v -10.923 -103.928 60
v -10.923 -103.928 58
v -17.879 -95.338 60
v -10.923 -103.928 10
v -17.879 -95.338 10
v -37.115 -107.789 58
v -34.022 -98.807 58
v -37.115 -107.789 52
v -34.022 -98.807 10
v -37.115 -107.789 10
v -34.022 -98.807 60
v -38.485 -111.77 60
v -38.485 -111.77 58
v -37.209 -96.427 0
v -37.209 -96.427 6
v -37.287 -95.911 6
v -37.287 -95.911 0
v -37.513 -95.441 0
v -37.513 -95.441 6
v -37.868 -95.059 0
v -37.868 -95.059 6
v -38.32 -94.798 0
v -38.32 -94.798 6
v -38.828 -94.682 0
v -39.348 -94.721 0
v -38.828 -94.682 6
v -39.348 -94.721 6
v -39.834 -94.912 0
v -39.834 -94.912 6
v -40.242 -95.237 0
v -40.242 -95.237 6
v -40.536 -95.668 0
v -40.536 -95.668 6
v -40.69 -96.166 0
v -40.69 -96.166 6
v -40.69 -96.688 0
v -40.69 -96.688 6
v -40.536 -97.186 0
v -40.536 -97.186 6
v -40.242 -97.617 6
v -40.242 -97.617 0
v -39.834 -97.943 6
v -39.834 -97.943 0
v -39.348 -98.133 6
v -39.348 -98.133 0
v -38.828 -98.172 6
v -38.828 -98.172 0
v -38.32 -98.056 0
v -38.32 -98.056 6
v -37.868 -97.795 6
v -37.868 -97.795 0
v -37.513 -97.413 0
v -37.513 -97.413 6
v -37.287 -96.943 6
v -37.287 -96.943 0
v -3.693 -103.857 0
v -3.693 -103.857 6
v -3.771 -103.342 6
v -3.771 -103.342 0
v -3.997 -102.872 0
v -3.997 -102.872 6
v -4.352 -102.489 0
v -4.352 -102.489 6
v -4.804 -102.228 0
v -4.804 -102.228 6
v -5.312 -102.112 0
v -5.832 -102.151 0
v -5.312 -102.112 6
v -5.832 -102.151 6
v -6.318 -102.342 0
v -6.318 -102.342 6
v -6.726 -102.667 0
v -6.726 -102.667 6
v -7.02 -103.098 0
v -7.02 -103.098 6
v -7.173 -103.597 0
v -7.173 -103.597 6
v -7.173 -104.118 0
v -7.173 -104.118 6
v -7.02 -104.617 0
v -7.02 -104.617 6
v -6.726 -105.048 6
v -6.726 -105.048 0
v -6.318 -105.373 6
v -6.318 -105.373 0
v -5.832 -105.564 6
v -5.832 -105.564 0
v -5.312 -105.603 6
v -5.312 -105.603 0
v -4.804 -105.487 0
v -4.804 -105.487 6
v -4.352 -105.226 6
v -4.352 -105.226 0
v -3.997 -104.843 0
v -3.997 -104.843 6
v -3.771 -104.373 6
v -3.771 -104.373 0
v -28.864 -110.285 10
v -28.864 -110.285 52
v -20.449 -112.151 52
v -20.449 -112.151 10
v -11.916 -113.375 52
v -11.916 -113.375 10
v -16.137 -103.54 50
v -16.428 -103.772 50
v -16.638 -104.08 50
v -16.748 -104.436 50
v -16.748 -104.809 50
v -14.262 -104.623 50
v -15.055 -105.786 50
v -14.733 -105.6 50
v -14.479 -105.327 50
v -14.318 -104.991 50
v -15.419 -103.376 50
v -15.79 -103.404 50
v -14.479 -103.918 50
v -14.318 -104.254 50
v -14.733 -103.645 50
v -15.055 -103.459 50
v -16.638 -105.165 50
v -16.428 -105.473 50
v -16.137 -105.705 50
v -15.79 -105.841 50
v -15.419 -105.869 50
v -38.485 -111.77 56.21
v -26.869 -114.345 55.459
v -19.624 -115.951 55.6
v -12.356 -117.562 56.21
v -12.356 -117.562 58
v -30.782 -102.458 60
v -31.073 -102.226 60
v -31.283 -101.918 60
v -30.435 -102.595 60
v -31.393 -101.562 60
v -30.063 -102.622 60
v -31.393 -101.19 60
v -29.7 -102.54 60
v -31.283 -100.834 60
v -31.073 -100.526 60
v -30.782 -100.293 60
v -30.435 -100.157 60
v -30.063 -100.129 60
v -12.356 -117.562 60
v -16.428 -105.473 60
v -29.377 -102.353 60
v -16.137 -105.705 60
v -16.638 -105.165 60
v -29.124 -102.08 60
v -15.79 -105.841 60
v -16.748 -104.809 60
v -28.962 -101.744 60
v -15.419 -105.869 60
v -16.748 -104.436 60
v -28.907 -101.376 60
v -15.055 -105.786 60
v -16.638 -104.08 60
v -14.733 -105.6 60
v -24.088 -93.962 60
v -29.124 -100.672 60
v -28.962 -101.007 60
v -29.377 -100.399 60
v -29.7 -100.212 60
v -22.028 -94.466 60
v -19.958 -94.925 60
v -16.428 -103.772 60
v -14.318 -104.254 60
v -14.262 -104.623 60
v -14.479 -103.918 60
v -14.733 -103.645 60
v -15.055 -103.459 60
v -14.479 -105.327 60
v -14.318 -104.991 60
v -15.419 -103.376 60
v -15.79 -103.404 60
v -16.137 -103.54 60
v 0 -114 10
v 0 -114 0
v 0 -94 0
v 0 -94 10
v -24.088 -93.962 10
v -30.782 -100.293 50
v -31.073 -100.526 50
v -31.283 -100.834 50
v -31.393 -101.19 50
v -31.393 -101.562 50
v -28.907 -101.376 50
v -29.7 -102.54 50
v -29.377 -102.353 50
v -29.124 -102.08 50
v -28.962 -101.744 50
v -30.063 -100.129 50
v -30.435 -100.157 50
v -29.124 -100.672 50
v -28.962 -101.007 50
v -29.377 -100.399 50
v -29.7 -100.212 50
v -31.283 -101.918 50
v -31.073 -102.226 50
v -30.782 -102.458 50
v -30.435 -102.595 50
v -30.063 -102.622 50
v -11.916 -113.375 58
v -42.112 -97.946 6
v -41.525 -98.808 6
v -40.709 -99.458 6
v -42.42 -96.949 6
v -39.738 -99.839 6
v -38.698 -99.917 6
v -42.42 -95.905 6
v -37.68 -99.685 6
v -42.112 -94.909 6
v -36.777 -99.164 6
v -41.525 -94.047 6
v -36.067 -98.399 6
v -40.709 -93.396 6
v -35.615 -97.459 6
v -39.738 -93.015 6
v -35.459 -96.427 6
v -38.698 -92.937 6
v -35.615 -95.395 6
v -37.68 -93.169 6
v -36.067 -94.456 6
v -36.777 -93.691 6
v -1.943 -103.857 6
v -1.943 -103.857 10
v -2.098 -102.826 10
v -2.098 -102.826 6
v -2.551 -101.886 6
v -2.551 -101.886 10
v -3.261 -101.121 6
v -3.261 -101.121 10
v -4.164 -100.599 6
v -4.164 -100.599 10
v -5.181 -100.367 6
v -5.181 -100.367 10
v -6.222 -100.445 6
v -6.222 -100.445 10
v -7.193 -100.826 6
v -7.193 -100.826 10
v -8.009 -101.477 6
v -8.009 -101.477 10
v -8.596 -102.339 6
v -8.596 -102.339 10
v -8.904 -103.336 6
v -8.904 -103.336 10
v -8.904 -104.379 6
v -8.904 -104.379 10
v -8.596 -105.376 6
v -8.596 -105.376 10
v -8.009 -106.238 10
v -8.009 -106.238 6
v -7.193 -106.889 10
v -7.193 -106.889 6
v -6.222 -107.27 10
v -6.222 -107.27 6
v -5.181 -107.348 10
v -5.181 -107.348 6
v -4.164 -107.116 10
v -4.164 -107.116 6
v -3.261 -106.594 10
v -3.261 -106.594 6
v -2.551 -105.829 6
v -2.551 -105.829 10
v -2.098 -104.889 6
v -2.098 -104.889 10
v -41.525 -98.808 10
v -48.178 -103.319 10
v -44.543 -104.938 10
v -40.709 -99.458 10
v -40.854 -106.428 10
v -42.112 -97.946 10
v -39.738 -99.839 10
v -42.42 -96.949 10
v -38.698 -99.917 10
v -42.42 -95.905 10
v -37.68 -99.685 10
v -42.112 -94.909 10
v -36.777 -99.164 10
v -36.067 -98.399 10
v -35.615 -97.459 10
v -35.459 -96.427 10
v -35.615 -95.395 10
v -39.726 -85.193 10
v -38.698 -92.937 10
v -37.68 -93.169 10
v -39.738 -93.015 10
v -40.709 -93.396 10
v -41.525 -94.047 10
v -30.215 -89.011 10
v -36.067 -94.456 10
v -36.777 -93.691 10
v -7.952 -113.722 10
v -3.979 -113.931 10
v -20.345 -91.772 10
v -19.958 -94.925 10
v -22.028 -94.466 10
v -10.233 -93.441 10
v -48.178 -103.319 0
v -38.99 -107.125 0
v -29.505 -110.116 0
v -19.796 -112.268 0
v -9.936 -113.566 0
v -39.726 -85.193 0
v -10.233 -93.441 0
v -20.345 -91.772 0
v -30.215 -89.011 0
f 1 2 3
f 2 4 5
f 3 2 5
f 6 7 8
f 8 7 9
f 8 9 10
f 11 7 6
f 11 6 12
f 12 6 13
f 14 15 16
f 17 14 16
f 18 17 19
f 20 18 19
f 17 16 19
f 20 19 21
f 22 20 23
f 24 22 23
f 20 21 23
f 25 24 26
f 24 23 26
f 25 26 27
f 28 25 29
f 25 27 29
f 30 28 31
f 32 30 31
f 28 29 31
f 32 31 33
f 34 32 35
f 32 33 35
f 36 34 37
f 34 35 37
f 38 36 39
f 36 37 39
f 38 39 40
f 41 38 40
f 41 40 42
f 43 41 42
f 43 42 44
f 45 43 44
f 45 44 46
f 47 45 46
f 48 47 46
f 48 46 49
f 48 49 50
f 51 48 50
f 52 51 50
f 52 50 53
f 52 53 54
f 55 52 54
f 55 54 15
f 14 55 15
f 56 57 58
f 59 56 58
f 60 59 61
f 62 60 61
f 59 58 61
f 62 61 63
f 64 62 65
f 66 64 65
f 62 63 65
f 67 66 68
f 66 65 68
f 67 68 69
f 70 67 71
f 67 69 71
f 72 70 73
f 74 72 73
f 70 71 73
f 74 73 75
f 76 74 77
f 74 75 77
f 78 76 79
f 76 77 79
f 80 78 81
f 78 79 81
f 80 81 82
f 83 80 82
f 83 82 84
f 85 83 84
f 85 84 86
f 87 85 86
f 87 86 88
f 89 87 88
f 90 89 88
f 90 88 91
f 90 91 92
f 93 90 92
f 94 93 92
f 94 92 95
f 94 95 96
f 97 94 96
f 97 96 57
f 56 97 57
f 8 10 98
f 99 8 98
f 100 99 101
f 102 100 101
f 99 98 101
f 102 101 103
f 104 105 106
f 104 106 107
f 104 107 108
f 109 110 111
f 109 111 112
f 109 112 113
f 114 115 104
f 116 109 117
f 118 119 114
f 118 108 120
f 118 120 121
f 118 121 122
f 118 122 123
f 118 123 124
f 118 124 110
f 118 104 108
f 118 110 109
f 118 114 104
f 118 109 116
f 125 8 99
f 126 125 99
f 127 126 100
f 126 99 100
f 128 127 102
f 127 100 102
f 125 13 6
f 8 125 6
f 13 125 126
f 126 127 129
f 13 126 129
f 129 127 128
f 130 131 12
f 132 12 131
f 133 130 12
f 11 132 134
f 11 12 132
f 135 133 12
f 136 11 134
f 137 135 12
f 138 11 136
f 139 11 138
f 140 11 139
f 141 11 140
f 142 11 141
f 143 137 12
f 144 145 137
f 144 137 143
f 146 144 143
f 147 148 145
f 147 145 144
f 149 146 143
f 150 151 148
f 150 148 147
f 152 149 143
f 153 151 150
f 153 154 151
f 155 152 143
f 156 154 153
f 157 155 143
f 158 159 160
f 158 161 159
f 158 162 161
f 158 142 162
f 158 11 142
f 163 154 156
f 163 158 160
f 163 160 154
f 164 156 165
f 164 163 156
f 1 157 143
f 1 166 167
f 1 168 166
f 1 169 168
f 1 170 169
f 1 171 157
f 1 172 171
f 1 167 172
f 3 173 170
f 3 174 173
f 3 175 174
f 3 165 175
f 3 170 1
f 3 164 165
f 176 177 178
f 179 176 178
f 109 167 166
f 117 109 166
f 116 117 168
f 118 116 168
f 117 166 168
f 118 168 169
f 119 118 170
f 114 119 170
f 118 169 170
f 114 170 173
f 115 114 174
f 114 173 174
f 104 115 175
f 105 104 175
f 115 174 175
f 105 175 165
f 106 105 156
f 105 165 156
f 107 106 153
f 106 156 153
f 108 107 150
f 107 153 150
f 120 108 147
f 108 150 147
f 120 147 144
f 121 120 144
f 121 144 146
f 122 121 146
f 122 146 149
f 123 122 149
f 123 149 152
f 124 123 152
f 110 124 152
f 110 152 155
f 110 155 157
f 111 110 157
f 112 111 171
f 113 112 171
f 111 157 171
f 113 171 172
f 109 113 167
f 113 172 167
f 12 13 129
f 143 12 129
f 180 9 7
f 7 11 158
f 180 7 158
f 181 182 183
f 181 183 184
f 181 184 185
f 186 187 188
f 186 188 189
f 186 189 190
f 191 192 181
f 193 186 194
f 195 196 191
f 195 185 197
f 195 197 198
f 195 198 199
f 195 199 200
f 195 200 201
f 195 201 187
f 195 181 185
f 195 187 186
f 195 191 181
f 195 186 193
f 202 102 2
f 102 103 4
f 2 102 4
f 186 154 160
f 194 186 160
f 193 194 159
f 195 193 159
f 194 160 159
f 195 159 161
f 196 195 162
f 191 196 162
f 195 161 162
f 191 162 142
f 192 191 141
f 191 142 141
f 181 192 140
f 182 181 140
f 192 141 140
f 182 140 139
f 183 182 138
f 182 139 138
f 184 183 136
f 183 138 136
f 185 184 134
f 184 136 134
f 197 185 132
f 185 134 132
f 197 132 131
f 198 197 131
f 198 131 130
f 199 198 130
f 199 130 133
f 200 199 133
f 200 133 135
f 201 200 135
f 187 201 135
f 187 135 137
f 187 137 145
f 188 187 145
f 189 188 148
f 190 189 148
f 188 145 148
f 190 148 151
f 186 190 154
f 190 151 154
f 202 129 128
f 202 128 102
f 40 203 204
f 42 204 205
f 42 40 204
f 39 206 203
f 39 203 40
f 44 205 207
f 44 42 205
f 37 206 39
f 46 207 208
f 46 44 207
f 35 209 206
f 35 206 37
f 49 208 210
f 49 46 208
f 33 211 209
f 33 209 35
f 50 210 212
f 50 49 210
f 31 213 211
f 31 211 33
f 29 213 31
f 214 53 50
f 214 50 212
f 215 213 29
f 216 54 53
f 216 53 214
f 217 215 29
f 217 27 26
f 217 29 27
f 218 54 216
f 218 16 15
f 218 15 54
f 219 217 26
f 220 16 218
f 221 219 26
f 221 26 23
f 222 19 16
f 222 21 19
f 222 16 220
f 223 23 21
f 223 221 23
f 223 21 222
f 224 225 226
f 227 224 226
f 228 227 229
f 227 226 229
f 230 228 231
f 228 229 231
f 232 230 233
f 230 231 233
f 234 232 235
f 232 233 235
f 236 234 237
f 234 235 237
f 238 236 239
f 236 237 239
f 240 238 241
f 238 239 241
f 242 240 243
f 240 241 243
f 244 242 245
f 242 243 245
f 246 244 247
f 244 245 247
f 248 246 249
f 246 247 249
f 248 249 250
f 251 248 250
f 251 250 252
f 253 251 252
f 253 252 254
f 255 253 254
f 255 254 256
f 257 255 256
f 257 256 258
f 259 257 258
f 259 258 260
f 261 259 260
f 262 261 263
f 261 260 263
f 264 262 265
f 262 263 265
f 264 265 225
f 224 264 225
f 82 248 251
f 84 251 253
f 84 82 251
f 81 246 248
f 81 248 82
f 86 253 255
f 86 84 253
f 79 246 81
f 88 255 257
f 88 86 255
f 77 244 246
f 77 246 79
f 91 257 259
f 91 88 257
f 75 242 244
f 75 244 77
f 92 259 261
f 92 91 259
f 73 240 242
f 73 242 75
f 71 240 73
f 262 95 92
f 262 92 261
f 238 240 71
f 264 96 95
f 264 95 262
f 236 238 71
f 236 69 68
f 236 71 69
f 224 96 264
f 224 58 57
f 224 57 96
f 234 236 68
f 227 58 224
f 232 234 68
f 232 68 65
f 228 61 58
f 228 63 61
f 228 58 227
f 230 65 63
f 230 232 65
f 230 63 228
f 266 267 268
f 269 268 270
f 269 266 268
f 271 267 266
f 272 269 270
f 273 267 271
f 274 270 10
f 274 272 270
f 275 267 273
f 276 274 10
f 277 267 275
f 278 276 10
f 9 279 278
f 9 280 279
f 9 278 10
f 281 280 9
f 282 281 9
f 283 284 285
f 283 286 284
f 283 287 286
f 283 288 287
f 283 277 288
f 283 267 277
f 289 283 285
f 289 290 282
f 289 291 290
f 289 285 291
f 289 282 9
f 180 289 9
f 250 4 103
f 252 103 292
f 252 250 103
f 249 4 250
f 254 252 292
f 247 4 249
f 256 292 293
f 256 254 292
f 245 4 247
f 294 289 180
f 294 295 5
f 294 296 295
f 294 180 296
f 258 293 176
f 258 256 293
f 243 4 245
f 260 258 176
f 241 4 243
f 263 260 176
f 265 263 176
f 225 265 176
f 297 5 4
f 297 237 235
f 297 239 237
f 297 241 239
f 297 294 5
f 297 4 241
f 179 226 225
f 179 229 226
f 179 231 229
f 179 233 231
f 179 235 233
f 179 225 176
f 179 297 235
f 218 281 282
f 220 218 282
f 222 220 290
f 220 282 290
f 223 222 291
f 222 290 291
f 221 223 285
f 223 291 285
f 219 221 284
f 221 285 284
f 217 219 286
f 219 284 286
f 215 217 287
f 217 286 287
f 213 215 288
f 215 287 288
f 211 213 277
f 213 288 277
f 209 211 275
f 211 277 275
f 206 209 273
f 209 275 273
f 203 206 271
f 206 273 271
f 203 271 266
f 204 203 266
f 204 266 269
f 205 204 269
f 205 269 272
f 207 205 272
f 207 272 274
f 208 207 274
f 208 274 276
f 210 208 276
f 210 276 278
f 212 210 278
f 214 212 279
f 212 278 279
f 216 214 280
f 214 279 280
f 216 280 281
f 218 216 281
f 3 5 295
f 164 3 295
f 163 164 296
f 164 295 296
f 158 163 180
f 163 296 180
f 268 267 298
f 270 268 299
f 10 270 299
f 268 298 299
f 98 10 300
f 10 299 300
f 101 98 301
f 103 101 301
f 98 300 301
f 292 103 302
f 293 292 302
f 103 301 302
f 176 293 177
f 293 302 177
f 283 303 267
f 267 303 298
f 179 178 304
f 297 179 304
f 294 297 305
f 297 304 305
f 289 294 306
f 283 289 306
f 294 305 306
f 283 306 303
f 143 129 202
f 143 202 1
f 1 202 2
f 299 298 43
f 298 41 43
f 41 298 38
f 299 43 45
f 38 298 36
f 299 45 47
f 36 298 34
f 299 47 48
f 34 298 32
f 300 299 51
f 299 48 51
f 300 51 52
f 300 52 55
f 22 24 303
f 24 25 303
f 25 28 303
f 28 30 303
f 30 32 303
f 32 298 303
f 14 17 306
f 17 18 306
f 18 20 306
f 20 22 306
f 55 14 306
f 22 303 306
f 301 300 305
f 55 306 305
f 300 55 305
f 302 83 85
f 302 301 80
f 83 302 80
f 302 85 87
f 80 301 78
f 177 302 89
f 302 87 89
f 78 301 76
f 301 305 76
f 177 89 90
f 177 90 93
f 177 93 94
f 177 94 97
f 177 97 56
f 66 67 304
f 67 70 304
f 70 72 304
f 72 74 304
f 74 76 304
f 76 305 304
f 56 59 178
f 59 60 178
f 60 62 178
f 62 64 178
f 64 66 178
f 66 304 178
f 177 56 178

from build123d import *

# Parameters (mm, degrees)
BOSS_EXTRU_1_DEPTH      = 10
BOSS_EXTRU_2_DEPTH      = 48
BOSS_EXTRU_3_DEPTH      = 2
CHANFREIN1_SIZE         = 6
ENL_V_MAT_EXTRU_1_REACH = 138.536
ESQUISSE5_R             = 1.75
ESQUISSE6_R             = 3.5
ENL_V_MAT_EXTRU_2_DEPTH = 4
CHANFREIN2_SIZE         = 7.5
ESQUISSE7_R             = 1.25
ENL_V_MAT_EXTRU_3_DEPTH = 10


with BuildPart() as part:
    # Esquisse1 → Boss.-Extru.1 (new body)
    with BuildSketch(Plane.XY):
        with BuildLine():
            Line((-39.726116604, -85.192931981), (-48.178481838, -103.319087722))
            ThreePointArc((-48.178481838, -103.319087722), (-24.674115989, -111.297744812), (0, -114))
            Line((0, -114), (0, -94))
            ThreePointArc((0, -94), (-20.34532371, -91.771824669), (-39.726116604, -85.192931981))
        make_face()
    extrude(amount=BOSS_EXTRU_1_DEPTH)

    # Esquisse2 → Boss.-Extru.2 (add)
    with BuildSketch(Plane.XY.offset(10)):
        with BuildLine():
            Line((-31.580110982, -91.715301833), (-37.114769608, -107.789117618))
            ThreePointArc((-37.114769608, -107.789117618), (-24.674115989, -111.297744812), (-11.916244813, -113.375496072))
            Line((-11.916244813, -113.375496072), (-10.139260937, -96.468623851))
            ThreePointArc((-10.139260937, -96.468623851), (-20.994642552, -94.700712691), (-31.580110982, -91.715301833))
        make_face()
    extrude(amount=BOSS_EXTRU_2_DEPTH)

    # Esquisse4 → Boss.-Extru.3 (add)
    with BuildSketch(Plane.XY.offset(58)):
        with BuildLine():
            Line((-38.485369249, -111.769628004), (-12.356296065, -117.562304069))
            Line((-12.356296065, -117.562304069), (-10.139260937, -96.468623851))
            ThreePointArc((-10.139260937, -96.468623851), (-20.994642552, -94.700712691), (-31.580110982, -91.715301833))
            Line((-31.580110982, -91.715301833), (-38.485369249, -111.769628004))
        make_face()
    extrude(amount=BOSS_EXTRU_3_DEPTH)

    # Chanfrein1
    # the kernel refuses this chamfer: 6 mm, written as the material it adds along each edge
    with BuildSketch(Plane(origin=(0, 0, 58), x_dir=(-0.3255681544571537, -0.9455185755993178, 0), z_dir=(-0.9455185755993178, 0.3255681544571537, 0))) as chanfrein1_piece_1_section:
        Polygon((114 + CHANFREIN1_SIZE, 0), (114, -CHANFREIN1_SIZE), (114, 0), align=None)
    chanfrein1_piece_1 = revolve(axis=Axis((0, 0, 58), (0, 0, 1)), revolution_arc=13, mode=Mode.PRIVATE)
    chanfrein1_piece_1 = split(chanfrein1_piece_1, bisect_by=Plane(origin=(-25.420832657, -114.665966036, 58), z_dir=(0.21643961393810382, 0.9762960071199333, 0)), keep=Keep.TOP, mode=Mode.PRIVATE)
    add(chanfrein1_piece_1)

    # Esquisse5 → Enlèv. mat.-Extru.1 (cut, up to next)
    with BuildSketch(Plane.XY.offset(10), mode=Mode.PRIVATE) as enl_v_mat_extru_1_sk1:
        with Locations((-5.442939449, -103.857471614)):
            Circle(ESQUISSE5_R)
    enl_v_mat_extru_1_tool1 = extrude(enl_v_mat_extru_1_sk1.sketch, amount=-ENL_V_MAT_EXTRU_1_REACH, mode=Mode.PRIVATE) & part.part
    # Esquisse5 → Enlèv. mat.-Extru.1 (cut, up to next)
    with BuildSketch(Plane.XY.offset(10), mode=Mode.PRIVATE) as enl_v_mat_extru_1_sk2:
        with Locations((-38.959085715, -96.427120875)):
            Circle(ESQUISSE5_R)
    enl_v_mat_extru_1_tool2 = extrude(enl_v_mat_extru_1_sk2.sketch, amount=-ENL_V_MAT_EXTRU_1_REACH, mode=Mode.PRIVATE) & part.part
    add(enl_v_mat_extru_1_tool1.solids().sort_by_distance((-5.442939, -103.857472, 10))[0], mode=Mode.SUBTRACT)
    add(enl_v_mat_extru_1_tool2.solids().sort_by_distance((-38.959086, -96.427121, 10))[0], mode=Mode.SUBTRACT)

    # Esquisse6 → Enlèv. mat.-Extru.2 (cut)
    with BuildSketch(Plane.XY.offset(10)):
        with Locations((-38.959085715, -96.427120875)):
            Circle(ESQUISSE6_R)
        with Locations((-5.442939449, -103.857471614)):
            Circle(ESQUISSE6_R)
    extrude(amount=-ENL_V_MAT_EXTRU_2_DEPTH, mode=Mode.SUBTRACT)

    # Chanfrein2
    # the kernel refuses this chamfer: 7.5 mm, written as the material it takes off along each edge
    with BuildSketch(Plane(origin=(-10.139260937, -96.468623851, 10), x_dir=(-0.10452846326693861, -0.9945218953683486, 0), z_dir=(0, 0, 1)), Plane(origin=(-31.580110982, -91.715301833, 80.112002728), x_dir=(-0.3255681544565627, -0.9455185755995213, 0), z_dir=(0, 0, -1))) as chanfrein2_piece_1:
        with BuildLine():
            Line((CHANFREIN2_SIZE, 0), (-0.315356984, -7.815356984))
            ThreePointArc((-0.315356984, -7.815356984), (-0.083387766, -4.021227803), (0, 0))
            Line((0, 0), (CHANFREIN2_SIZE, 0))
        make_face()
    extrude(amount=70.112002728, mode=Mode.SUBTRACT)

    # Esquisse7 → Enlèv. mat.-Extru.3 (cut)
    with BuildSketch(Plane.XY.offset(60)):
        with Locations((-30.156599324, -101.375931647)):
            Circle(ESQUISSE7_R)
        with Locations((-15.512159217, -104.622525856)):
            Circle(ESQUISSE7_R)
    extrude(amount=-ENL_V_MAT_EXTRU_3_DEPTH, mode=Mode.SUBTRACT)


solid = part.part
